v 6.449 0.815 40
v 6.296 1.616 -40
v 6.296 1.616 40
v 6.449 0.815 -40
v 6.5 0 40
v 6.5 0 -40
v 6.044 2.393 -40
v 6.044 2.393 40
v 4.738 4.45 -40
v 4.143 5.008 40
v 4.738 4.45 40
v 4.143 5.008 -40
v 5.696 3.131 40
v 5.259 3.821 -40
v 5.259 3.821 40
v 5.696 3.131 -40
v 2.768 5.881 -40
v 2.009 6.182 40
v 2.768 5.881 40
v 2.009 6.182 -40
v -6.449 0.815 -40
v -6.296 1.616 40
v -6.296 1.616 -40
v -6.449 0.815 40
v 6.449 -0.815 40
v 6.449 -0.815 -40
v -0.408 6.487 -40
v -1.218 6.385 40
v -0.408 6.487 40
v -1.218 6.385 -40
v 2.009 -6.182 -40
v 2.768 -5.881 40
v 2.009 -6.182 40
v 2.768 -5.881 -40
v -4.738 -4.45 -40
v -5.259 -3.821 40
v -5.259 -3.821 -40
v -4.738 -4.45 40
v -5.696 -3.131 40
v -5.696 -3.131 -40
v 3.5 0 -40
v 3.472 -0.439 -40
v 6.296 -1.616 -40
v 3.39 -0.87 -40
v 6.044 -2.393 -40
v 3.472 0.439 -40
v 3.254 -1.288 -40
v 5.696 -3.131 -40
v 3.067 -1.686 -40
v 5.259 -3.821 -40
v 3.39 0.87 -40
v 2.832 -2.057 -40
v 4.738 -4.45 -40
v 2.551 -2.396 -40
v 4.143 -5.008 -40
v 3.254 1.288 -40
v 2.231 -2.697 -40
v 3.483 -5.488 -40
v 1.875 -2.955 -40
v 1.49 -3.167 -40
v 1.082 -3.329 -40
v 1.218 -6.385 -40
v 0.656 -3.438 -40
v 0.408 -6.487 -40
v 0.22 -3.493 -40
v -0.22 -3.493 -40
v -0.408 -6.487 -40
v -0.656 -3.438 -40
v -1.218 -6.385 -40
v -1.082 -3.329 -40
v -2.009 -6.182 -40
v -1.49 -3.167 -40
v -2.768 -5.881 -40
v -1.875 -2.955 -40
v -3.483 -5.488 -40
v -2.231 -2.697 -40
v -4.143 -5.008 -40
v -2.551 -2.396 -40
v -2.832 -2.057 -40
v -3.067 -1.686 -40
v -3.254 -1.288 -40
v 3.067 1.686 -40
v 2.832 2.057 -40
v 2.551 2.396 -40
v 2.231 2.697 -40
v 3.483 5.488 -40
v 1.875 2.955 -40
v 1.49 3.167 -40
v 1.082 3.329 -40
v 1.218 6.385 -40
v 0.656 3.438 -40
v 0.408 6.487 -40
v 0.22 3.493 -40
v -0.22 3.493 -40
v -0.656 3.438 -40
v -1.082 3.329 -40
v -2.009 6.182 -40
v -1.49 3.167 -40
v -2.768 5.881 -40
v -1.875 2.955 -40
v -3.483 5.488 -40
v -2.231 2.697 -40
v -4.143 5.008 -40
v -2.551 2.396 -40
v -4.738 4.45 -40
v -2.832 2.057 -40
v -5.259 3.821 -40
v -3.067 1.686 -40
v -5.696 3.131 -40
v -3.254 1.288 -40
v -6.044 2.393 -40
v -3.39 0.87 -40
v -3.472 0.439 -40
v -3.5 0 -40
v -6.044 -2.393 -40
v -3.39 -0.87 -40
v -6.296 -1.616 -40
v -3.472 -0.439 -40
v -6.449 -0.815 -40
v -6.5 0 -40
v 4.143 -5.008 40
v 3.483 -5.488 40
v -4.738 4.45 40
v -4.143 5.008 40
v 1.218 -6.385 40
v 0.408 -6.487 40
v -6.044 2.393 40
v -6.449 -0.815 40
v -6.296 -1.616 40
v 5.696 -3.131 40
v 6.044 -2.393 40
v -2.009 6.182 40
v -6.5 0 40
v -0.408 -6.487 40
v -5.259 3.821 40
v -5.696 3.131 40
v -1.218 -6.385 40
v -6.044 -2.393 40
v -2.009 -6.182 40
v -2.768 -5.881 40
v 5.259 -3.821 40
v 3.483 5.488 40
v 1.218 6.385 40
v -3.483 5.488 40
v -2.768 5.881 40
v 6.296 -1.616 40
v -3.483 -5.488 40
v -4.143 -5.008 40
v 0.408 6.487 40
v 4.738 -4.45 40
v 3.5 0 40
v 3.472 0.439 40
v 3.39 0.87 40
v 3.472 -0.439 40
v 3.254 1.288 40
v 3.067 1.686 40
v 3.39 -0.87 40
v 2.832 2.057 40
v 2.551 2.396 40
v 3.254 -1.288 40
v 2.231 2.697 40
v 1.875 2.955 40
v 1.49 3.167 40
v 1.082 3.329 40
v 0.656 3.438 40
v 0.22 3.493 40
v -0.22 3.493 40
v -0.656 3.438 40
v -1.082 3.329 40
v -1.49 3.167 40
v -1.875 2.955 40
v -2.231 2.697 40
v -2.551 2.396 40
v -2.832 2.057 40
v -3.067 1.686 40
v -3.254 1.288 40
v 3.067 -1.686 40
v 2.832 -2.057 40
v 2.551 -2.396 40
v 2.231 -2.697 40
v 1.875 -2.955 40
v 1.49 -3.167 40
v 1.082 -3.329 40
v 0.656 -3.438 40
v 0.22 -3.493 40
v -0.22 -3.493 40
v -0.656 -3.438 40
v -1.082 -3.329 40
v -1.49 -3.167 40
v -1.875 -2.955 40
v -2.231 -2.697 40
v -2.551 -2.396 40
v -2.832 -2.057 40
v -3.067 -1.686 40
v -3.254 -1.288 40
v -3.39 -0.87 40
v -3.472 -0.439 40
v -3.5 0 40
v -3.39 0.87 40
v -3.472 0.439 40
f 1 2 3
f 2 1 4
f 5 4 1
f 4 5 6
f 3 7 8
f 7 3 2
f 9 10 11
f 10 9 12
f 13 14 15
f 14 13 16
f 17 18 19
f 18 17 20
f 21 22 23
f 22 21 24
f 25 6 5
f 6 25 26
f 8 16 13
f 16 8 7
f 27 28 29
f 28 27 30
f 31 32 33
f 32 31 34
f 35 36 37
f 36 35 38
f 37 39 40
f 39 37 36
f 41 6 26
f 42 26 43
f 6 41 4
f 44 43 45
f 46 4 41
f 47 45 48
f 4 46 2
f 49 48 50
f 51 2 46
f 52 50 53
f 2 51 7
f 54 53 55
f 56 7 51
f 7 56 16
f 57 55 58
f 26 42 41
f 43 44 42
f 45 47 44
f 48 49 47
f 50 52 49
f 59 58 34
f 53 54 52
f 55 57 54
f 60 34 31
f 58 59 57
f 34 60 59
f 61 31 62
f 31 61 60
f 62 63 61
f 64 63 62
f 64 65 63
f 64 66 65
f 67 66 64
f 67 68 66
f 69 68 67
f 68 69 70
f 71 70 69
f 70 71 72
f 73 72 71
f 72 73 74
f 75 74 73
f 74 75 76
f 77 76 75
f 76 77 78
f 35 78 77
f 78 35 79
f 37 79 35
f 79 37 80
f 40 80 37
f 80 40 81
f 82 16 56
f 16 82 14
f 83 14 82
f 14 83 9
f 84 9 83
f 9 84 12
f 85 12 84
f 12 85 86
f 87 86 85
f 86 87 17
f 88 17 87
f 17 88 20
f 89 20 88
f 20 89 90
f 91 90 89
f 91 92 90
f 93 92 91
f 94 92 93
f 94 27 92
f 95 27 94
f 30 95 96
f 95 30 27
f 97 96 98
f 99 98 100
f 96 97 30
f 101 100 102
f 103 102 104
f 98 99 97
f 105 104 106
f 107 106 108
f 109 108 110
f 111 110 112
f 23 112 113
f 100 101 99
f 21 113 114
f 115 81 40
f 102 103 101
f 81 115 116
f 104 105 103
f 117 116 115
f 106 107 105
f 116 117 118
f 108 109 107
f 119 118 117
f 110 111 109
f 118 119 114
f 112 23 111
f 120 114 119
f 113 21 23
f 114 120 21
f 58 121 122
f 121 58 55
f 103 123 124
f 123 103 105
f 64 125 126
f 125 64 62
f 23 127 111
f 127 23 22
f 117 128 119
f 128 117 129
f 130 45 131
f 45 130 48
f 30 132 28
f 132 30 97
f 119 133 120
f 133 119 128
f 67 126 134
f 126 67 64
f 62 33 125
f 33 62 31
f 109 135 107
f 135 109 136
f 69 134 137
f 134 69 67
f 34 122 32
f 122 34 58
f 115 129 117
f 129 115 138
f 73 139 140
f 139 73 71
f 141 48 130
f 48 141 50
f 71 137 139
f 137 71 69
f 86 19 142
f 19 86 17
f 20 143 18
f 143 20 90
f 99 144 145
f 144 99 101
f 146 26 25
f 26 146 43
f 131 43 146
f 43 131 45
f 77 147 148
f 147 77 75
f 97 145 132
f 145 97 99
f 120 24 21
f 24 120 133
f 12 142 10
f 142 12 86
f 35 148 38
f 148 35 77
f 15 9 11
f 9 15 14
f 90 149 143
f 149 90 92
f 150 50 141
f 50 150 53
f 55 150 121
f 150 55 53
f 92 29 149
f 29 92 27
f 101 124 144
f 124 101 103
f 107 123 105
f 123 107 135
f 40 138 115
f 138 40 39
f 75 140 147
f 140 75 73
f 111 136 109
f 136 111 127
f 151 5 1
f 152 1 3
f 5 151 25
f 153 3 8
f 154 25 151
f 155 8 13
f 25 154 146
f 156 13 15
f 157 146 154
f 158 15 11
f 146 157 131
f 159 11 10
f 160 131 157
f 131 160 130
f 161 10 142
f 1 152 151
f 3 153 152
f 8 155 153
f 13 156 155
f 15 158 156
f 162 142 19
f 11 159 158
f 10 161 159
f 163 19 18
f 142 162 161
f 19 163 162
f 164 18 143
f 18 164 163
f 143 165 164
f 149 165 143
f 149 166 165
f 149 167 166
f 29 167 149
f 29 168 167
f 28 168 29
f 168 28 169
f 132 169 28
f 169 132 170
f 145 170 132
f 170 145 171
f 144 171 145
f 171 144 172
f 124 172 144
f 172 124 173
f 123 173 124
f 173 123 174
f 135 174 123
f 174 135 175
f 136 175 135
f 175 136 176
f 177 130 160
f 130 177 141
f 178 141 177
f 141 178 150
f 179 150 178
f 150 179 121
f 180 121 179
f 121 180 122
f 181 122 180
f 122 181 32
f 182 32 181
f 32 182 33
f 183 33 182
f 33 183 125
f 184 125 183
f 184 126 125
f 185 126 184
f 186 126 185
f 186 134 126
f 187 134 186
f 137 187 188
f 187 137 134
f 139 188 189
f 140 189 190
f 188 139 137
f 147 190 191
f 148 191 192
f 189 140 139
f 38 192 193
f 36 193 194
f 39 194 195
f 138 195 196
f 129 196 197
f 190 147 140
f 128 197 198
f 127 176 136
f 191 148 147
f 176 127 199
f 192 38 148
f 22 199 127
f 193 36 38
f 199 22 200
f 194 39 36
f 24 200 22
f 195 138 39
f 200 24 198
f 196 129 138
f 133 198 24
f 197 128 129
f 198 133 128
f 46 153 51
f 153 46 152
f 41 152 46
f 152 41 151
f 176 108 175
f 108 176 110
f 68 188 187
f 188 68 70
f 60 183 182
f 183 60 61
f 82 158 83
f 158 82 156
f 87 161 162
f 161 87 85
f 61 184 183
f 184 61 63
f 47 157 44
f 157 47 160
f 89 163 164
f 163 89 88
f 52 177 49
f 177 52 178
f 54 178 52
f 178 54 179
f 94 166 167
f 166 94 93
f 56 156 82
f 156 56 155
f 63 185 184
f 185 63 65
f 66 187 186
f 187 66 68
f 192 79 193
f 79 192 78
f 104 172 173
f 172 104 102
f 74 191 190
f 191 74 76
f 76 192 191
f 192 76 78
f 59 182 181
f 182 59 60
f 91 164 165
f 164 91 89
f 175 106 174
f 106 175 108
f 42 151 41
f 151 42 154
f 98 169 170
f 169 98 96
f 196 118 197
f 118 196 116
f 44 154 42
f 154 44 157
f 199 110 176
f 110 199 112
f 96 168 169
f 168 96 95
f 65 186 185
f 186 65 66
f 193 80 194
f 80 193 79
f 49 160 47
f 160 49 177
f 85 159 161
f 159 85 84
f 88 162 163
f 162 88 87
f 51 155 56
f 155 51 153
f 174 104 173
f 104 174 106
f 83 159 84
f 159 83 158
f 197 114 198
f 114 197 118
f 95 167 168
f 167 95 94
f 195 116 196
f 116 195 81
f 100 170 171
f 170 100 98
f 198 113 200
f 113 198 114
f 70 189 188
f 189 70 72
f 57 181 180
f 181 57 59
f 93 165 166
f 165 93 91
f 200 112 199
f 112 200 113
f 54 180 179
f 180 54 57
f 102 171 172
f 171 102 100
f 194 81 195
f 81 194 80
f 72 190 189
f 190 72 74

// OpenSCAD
$fn = 50;


difference() {
	union() {
		translate(v = [0, 0, -40.0000000000]) {
			cylinder(h = 80, r = 6.5000000000);
		}
	}
	union() {
		translate(v = [0, 0, -100.0000000000]) {
			cylinder(h = 200, r = 3.5000000000);
		}
	}
}
